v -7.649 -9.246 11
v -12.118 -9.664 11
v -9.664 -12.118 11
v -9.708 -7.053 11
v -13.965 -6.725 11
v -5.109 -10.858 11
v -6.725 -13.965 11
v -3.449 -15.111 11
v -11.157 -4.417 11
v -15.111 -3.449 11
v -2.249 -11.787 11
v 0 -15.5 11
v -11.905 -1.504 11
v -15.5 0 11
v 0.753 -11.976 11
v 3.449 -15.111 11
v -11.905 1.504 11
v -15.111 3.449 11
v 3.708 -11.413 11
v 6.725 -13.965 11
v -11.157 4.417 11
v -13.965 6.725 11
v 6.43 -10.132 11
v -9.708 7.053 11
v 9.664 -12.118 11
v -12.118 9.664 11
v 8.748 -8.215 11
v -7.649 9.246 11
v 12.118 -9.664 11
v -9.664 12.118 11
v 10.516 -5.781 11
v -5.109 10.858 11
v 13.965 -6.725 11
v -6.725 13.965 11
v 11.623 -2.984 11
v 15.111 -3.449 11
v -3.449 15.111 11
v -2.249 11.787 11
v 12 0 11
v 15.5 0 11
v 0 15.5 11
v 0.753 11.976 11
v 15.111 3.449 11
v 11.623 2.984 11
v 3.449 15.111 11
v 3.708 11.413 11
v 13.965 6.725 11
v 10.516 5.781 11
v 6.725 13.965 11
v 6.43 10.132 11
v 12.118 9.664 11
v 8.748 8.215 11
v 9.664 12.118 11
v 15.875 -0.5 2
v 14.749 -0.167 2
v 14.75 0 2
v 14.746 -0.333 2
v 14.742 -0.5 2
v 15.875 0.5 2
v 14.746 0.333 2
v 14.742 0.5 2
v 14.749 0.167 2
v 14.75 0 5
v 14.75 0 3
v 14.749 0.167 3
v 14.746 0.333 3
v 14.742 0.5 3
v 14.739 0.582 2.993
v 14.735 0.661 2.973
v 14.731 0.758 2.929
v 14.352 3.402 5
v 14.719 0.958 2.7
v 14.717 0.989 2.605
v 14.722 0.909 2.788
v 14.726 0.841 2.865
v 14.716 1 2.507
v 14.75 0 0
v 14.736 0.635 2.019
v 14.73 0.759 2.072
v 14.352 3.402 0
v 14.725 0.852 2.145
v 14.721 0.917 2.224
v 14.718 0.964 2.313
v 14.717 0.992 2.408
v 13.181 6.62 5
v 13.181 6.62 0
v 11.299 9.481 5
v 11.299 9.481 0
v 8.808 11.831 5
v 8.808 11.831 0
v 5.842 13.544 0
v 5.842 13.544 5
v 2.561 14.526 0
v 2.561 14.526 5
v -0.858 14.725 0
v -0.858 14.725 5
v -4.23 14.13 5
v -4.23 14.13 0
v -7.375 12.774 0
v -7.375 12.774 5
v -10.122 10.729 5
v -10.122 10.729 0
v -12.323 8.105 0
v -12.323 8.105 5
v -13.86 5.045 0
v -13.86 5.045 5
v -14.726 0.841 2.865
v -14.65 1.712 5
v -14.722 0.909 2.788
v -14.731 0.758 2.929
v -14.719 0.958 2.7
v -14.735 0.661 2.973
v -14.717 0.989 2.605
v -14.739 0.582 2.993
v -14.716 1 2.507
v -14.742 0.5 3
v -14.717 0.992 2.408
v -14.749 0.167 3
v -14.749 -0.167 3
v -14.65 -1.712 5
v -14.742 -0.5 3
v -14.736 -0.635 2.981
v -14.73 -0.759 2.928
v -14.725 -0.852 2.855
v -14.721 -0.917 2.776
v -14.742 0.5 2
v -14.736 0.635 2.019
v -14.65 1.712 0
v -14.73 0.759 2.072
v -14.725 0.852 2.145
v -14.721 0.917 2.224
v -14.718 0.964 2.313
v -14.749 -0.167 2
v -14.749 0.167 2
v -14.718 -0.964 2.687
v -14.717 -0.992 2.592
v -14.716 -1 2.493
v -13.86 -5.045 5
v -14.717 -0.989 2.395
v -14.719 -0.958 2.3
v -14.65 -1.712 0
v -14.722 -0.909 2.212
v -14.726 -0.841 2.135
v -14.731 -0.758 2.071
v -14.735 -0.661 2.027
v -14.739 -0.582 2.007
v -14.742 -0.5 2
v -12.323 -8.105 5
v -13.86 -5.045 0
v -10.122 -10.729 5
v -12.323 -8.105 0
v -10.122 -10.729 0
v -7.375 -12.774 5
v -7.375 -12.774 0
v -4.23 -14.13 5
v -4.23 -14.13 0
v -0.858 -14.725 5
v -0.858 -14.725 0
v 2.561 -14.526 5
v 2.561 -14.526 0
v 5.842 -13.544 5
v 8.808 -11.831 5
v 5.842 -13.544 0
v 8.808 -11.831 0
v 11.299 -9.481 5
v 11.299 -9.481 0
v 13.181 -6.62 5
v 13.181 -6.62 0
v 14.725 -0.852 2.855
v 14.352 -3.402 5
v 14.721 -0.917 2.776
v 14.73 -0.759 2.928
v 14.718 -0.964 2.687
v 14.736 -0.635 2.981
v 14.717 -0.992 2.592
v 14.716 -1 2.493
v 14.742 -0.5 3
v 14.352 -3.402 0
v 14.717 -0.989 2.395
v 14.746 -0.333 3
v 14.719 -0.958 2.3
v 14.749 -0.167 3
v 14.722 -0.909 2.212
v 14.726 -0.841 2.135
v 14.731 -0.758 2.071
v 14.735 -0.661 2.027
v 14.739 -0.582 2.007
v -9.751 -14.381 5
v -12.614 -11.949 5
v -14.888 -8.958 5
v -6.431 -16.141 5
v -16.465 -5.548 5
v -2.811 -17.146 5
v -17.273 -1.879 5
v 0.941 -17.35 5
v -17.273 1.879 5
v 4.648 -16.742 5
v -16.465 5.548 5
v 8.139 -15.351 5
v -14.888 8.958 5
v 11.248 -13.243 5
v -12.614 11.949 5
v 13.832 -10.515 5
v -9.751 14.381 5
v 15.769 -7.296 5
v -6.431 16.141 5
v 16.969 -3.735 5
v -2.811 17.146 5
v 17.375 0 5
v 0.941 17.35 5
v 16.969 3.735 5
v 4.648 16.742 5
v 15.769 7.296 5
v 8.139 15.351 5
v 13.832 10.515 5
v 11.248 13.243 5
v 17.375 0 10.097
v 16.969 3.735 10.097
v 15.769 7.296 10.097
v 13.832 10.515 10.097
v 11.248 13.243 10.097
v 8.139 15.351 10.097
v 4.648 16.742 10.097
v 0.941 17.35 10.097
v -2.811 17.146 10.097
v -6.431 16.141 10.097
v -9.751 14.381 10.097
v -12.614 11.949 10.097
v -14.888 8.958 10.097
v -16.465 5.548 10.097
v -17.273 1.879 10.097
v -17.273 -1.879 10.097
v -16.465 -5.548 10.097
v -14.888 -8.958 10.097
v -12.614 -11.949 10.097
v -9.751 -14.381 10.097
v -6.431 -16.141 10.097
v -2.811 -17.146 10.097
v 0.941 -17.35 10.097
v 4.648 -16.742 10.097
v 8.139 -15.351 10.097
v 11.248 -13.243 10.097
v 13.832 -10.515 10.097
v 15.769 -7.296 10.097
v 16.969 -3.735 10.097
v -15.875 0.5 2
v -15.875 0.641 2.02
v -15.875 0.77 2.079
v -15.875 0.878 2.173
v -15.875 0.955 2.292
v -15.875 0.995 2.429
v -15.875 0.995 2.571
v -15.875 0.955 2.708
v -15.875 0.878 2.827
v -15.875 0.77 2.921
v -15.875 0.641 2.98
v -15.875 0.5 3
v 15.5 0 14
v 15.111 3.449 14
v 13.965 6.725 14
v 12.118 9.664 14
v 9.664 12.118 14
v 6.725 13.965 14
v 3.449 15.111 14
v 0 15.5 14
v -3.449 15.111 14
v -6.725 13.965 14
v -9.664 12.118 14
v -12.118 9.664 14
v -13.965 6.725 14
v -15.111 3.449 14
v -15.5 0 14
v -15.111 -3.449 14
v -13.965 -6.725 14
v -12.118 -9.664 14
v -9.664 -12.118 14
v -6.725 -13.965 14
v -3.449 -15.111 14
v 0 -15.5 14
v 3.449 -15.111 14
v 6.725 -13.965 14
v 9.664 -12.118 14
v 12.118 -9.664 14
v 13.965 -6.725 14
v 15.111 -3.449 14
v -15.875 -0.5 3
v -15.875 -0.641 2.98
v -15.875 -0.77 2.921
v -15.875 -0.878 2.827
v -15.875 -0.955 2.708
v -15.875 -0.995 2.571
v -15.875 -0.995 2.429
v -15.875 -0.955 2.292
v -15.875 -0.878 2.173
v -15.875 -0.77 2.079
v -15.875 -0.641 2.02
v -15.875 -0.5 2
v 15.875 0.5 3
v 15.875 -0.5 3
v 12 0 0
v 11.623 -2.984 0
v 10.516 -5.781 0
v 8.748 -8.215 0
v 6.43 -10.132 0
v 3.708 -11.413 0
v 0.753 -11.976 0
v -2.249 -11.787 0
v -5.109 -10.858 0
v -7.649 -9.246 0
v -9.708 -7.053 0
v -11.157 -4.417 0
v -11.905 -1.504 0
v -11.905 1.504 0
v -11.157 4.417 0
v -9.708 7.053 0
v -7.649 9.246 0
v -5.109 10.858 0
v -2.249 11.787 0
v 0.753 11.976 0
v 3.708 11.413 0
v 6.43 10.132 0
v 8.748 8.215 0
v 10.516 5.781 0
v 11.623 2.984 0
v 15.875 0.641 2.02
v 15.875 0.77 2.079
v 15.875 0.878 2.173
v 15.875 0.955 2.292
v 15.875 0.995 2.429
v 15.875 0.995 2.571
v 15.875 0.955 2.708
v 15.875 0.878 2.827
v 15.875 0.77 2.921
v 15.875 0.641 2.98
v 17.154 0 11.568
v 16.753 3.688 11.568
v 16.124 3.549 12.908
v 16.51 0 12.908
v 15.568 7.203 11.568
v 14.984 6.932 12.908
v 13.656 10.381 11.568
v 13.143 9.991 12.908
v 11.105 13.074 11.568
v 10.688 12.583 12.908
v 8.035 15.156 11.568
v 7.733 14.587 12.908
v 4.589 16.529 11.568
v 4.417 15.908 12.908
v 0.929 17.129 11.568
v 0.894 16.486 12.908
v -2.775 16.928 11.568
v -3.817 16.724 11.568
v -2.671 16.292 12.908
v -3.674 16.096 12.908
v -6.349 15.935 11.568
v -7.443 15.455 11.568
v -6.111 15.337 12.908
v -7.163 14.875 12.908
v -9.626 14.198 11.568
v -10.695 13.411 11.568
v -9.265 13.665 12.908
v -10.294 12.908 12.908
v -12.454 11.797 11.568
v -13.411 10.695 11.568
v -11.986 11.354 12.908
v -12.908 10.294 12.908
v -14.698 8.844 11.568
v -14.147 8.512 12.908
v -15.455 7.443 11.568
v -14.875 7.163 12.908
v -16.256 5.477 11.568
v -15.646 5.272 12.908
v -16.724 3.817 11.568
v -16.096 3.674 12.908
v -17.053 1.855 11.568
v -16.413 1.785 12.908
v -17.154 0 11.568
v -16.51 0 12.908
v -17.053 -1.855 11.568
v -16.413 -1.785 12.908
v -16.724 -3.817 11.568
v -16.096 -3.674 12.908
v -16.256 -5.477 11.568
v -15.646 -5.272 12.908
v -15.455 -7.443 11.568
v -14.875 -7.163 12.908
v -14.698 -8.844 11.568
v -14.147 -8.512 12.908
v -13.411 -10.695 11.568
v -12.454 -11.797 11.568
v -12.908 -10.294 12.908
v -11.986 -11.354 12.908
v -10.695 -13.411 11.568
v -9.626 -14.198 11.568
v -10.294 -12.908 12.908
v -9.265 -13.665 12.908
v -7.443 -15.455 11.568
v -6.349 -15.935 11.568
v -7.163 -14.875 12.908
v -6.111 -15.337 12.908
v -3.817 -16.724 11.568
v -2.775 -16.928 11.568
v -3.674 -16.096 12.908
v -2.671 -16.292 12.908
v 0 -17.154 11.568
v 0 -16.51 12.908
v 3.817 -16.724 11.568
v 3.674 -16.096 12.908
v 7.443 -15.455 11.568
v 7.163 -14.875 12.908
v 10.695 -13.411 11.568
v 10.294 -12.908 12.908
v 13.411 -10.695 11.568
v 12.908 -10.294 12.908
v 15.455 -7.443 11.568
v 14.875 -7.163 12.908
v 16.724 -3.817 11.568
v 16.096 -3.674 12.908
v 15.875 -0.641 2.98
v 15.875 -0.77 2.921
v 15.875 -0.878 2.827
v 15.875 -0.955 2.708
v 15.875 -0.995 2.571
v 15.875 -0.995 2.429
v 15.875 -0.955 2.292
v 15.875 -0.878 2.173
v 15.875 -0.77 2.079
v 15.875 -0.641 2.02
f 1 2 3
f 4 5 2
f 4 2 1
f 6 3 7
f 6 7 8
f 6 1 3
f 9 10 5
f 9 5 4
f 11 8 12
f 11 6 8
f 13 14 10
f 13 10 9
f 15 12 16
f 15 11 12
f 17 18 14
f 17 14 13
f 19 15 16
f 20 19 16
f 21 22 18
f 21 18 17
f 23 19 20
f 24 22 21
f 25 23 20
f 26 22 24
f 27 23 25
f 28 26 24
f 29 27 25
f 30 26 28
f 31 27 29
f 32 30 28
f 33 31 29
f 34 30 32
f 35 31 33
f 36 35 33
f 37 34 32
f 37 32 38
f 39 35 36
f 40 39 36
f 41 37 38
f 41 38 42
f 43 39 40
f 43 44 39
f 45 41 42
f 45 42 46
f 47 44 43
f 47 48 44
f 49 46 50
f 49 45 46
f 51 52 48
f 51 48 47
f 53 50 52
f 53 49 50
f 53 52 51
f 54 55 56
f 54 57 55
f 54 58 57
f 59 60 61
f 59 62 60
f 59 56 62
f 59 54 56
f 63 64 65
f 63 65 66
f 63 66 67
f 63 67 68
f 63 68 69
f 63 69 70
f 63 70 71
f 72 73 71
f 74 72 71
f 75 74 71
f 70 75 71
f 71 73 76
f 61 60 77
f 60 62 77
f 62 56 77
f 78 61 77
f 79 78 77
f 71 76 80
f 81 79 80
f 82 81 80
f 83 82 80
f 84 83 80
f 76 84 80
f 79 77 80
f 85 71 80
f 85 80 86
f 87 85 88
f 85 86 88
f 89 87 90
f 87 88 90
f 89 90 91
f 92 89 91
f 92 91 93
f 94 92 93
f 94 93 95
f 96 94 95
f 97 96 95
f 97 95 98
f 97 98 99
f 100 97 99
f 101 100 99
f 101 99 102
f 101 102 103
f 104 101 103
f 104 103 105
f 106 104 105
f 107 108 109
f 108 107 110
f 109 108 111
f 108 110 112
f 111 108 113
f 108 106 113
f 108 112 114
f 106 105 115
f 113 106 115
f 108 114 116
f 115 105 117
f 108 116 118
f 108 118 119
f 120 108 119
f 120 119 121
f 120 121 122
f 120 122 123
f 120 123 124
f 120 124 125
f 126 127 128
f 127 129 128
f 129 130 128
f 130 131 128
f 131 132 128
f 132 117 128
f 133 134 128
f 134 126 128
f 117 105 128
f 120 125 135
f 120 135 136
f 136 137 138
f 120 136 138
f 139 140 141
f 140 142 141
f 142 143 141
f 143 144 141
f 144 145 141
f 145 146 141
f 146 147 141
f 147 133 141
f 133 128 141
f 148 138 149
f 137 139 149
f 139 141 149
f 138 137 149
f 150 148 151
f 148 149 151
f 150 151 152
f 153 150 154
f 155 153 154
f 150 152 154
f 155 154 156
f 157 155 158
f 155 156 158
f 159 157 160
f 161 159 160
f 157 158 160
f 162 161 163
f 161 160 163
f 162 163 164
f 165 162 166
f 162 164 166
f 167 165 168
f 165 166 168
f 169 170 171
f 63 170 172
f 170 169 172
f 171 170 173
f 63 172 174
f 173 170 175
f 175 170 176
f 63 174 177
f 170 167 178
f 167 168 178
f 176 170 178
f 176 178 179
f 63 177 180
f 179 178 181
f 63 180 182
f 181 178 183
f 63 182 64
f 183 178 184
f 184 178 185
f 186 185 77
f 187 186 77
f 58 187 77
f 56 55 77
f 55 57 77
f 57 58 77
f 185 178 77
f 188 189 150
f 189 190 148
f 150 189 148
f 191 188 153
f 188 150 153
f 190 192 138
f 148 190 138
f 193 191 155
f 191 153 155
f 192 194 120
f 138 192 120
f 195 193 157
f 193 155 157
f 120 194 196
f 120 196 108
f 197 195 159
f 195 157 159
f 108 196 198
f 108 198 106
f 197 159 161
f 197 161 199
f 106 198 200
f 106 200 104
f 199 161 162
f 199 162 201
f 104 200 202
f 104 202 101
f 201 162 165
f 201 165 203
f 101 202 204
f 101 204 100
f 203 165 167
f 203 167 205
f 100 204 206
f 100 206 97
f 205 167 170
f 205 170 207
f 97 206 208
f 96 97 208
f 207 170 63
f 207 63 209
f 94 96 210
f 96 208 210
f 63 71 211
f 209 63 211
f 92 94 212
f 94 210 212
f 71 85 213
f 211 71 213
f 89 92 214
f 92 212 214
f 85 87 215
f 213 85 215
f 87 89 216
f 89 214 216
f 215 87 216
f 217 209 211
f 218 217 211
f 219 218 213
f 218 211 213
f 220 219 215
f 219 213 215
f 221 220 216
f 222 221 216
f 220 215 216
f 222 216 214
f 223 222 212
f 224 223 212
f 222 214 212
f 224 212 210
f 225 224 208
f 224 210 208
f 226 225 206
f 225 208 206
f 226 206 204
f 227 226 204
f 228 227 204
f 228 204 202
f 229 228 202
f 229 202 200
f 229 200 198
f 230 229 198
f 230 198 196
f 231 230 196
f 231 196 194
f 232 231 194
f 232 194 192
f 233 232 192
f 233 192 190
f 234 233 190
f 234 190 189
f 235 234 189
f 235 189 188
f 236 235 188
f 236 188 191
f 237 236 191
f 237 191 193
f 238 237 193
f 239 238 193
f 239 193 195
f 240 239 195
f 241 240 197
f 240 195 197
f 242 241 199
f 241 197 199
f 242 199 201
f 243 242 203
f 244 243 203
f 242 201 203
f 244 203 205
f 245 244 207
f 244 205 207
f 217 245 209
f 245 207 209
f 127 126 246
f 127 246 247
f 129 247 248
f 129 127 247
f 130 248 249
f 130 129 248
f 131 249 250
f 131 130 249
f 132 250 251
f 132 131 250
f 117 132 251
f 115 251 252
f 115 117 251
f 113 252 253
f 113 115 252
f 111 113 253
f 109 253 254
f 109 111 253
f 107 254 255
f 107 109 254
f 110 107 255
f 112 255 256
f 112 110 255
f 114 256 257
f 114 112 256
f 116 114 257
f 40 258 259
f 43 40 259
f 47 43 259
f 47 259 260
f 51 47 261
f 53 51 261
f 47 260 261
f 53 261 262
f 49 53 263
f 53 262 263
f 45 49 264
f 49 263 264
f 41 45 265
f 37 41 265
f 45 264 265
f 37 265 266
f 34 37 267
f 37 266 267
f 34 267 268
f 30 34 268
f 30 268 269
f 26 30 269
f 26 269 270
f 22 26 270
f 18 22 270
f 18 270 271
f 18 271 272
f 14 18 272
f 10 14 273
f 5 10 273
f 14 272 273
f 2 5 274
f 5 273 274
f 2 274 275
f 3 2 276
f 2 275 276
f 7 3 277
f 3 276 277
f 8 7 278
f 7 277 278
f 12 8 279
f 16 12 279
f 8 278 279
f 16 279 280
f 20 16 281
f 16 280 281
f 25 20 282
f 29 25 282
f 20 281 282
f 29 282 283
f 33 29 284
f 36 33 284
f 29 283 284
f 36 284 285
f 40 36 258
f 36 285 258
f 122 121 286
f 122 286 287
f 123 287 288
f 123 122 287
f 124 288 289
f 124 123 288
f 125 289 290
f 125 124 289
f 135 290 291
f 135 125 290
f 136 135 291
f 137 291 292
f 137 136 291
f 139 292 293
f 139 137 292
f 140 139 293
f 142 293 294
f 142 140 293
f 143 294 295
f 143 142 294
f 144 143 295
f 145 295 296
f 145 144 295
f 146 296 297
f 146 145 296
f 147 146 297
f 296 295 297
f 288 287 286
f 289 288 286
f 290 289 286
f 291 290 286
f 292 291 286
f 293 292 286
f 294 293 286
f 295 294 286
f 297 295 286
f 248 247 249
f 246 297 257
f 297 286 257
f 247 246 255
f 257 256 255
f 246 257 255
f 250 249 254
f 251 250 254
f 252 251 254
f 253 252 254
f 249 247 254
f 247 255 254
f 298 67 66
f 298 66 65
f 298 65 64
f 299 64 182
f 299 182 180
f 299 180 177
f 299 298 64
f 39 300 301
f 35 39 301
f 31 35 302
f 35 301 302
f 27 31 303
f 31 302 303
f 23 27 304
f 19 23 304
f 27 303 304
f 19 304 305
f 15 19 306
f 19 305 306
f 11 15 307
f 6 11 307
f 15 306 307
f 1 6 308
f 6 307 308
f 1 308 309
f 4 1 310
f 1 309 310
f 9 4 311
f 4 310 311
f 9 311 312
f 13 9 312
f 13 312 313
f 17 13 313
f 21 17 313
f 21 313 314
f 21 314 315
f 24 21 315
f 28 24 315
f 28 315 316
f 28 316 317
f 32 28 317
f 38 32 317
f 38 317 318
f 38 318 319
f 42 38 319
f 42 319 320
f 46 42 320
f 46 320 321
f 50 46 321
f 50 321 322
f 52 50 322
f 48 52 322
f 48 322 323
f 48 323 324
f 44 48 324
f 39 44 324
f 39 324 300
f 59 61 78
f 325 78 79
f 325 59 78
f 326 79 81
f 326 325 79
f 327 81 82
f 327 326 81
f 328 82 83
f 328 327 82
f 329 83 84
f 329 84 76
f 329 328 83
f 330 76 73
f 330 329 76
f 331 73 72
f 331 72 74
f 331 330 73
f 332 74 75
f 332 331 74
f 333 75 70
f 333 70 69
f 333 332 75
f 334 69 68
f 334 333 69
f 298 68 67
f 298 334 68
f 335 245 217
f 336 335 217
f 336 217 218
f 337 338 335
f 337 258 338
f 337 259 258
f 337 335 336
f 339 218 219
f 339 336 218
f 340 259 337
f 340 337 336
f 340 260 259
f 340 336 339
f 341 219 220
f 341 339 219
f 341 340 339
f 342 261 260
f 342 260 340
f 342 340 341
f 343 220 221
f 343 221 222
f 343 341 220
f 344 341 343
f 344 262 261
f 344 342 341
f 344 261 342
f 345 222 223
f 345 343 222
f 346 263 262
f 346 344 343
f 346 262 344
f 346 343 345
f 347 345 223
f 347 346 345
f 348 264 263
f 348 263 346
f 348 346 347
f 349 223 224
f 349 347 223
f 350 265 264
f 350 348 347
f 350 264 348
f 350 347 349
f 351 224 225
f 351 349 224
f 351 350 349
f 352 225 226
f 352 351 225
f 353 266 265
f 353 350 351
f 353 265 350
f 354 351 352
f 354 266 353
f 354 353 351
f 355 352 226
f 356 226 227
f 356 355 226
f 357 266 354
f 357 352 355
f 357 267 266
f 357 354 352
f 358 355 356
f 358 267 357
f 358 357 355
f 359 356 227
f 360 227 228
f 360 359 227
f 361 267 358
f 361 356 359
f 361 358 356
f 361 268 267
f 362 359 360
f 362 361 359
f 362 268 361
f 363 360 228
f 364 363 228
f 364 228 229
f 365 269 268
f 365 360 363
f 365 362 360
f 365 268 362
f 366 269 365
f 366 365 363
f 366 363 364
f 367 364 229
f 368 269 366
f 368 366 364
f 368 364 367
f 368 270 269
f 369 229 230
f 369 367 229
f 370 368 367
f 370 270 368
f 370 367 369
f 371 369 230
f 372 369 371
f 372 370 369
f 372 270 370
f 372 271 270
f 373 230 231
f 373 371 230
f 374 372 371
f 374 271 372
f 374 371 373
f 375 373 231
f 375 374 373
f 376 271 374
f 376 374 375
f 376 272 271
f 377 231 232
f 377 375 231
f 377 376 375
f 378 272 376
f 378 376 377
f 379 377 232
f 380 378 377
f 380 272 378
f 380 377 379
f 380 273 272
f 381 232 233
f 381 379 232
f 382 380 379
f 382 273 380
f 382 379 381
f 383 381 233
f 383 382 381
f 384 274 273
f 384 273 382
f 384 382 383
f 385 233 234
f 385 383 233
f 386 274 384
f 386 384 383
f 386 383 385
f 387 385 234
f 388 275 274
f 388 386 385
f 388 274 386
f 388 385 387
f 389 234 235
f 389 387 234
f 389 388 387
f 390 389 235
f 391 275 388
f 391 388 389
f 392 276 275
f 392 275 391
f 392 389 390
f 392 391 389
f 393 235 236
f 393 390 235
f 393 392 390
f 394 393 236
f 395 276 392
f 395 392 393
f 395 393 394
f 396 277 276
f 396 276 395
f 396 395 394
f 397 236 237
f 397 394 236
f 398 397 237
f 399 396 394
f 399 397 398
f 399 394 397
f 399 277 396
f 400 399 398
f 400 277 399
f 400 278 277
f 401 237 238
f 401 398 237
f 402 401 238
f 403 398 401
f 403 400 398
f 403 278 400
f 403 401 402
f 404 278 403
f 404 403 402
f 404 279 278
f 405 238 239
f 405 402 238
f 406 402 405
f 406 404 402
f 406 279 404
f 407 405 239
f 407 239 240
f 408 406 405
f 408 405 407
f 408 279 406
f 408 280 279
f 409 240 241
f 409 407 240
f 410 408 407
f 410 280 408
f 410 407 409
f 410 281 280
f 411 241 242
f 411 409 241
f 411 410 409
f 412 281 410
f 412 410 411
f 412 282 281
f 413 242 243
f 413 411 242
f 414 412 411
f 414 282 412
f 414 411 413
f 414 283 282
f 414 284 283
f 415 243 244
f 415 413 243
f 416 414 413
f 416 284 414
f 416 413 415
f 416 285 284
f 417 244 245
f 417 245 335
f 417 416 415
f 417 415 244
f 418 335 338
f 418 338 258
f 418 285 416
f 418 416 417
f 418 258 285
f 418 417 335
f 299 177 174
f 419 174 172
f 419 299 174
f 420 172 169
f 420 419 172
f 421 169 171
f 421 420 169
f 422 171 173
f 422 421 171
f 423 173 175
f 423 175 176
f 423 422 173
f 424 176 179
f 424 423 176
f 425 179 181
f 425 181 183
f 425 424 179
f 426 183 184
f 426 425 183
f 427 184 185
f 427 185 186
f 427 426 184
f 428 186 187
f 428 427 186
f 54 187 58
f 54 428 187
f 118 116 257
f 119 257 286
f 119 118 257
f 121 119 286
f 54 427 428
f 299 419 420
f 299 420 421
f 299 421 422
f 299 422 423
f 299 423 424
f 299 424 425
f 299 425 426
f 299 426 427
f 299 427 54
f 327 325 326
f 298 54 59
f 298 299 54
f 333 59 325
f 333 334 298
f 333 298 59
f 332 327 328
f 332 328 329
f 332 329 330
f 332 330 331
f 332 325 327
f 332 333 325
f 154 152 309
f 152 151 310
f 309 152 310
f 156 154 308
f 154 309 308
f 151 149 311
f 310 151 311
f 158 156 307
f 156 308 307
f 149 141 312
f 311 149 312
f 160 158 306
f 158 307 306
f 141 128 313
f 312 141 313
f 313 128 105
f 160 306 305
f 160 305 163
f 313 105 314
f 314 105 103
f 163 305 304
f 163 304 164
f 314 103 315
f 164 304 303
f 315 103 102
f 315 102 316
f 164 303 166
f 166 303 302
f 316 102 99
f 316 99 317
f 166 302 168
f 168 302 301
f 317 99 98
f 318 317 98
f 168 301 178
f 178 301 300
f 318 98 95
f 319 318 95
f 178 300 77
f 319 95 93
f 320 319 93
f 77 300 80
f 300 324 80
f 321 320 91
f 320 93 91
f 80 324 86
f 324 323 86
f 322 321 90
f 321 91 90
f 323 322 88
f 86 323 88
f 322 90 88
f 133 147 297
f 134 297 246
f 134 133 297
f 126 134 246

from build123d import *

# Parameters (mm, degrees)
F0_R     = 14.75
F1_DEPTH = 5
F2_R     = 17.375
F3_DEPTH = 9
F5_DEPTH = 15.875
F6_R     = 12
F7_DEPTH = 15
F8_R     = 15.5
F9_DEPTH = 3


# Not quite as in the source:
# - a fillet or chamfer that OpenCascade refuses, or shapes differently, is made with other operations: its cross-section is extruded or revolved along the edge and cut away or added


with BuildPart() as f1:
    # F0 (on Top) → F1 (new body)
    with BuildSketch(Plane.XY):
        Circle(F0_R)
    extrude(amount=F1_DEPTH)

    # F2 (on face) → F3 (join)
    with BuildSketch(Plane.XY.offset(5)):
        Circle(F2_R)
    extrude(amount=F3_DEPTH)

    # F4 (on Right) → F5 (join, symmetric)
    with BuildSketch(Plane.YZ):
        with BuildLine():
            Line((0.5, 3), (-0.5, 3))
            ThreePointArc((-0.5, 3), (-1, 2.5), (-0.5, 2))
            Line((-0.5, 2), (0.5, 2))
            ThreePointArc((0.5, 2), (1, 2.5), (0.5, 3))
        make_face()
    extrude(amount=F5_DEPTH, both=True)

    # F6 (on face) → F7 (cut)
    with BuildSketch(Plane(origin=(0, 0, 0), x_dir=(1, 0, 0), z_dir=(0, 0, -1))):
        Circle(F6_R)
    extrude(amount=-F7_DEPTH, mode=Mode.SUBTRACT)

    # F8 (on face) → F9 (cut)
    with BuildSketch(Plane.XY.offset(14)):
        Circle(F8_R)
    extrude(amount=-F9_DEPTH, mode=Mode.SUBTRACT)

    # F10: fillet of radius 5 on 1 edges, made by hand

    # F10_s1 → F10_t2 (revolve, cut)
    with BuildSketch(Plane.XZ):
        with BuildLine():
            ThreePointArc((17.375, 10.096876251), (16.8819390943, 12.2619397605), (15.5, 14))
            Line((15.5, 14), (17.375, 14))
            Line((17.375, 14), (17.375, 10.096876251))
        make_face()
    revolve(axis=Axis((0, 0, 14), (0, 0, 1)), mode=Mode.SUBTRACT)


solid = f1.part
